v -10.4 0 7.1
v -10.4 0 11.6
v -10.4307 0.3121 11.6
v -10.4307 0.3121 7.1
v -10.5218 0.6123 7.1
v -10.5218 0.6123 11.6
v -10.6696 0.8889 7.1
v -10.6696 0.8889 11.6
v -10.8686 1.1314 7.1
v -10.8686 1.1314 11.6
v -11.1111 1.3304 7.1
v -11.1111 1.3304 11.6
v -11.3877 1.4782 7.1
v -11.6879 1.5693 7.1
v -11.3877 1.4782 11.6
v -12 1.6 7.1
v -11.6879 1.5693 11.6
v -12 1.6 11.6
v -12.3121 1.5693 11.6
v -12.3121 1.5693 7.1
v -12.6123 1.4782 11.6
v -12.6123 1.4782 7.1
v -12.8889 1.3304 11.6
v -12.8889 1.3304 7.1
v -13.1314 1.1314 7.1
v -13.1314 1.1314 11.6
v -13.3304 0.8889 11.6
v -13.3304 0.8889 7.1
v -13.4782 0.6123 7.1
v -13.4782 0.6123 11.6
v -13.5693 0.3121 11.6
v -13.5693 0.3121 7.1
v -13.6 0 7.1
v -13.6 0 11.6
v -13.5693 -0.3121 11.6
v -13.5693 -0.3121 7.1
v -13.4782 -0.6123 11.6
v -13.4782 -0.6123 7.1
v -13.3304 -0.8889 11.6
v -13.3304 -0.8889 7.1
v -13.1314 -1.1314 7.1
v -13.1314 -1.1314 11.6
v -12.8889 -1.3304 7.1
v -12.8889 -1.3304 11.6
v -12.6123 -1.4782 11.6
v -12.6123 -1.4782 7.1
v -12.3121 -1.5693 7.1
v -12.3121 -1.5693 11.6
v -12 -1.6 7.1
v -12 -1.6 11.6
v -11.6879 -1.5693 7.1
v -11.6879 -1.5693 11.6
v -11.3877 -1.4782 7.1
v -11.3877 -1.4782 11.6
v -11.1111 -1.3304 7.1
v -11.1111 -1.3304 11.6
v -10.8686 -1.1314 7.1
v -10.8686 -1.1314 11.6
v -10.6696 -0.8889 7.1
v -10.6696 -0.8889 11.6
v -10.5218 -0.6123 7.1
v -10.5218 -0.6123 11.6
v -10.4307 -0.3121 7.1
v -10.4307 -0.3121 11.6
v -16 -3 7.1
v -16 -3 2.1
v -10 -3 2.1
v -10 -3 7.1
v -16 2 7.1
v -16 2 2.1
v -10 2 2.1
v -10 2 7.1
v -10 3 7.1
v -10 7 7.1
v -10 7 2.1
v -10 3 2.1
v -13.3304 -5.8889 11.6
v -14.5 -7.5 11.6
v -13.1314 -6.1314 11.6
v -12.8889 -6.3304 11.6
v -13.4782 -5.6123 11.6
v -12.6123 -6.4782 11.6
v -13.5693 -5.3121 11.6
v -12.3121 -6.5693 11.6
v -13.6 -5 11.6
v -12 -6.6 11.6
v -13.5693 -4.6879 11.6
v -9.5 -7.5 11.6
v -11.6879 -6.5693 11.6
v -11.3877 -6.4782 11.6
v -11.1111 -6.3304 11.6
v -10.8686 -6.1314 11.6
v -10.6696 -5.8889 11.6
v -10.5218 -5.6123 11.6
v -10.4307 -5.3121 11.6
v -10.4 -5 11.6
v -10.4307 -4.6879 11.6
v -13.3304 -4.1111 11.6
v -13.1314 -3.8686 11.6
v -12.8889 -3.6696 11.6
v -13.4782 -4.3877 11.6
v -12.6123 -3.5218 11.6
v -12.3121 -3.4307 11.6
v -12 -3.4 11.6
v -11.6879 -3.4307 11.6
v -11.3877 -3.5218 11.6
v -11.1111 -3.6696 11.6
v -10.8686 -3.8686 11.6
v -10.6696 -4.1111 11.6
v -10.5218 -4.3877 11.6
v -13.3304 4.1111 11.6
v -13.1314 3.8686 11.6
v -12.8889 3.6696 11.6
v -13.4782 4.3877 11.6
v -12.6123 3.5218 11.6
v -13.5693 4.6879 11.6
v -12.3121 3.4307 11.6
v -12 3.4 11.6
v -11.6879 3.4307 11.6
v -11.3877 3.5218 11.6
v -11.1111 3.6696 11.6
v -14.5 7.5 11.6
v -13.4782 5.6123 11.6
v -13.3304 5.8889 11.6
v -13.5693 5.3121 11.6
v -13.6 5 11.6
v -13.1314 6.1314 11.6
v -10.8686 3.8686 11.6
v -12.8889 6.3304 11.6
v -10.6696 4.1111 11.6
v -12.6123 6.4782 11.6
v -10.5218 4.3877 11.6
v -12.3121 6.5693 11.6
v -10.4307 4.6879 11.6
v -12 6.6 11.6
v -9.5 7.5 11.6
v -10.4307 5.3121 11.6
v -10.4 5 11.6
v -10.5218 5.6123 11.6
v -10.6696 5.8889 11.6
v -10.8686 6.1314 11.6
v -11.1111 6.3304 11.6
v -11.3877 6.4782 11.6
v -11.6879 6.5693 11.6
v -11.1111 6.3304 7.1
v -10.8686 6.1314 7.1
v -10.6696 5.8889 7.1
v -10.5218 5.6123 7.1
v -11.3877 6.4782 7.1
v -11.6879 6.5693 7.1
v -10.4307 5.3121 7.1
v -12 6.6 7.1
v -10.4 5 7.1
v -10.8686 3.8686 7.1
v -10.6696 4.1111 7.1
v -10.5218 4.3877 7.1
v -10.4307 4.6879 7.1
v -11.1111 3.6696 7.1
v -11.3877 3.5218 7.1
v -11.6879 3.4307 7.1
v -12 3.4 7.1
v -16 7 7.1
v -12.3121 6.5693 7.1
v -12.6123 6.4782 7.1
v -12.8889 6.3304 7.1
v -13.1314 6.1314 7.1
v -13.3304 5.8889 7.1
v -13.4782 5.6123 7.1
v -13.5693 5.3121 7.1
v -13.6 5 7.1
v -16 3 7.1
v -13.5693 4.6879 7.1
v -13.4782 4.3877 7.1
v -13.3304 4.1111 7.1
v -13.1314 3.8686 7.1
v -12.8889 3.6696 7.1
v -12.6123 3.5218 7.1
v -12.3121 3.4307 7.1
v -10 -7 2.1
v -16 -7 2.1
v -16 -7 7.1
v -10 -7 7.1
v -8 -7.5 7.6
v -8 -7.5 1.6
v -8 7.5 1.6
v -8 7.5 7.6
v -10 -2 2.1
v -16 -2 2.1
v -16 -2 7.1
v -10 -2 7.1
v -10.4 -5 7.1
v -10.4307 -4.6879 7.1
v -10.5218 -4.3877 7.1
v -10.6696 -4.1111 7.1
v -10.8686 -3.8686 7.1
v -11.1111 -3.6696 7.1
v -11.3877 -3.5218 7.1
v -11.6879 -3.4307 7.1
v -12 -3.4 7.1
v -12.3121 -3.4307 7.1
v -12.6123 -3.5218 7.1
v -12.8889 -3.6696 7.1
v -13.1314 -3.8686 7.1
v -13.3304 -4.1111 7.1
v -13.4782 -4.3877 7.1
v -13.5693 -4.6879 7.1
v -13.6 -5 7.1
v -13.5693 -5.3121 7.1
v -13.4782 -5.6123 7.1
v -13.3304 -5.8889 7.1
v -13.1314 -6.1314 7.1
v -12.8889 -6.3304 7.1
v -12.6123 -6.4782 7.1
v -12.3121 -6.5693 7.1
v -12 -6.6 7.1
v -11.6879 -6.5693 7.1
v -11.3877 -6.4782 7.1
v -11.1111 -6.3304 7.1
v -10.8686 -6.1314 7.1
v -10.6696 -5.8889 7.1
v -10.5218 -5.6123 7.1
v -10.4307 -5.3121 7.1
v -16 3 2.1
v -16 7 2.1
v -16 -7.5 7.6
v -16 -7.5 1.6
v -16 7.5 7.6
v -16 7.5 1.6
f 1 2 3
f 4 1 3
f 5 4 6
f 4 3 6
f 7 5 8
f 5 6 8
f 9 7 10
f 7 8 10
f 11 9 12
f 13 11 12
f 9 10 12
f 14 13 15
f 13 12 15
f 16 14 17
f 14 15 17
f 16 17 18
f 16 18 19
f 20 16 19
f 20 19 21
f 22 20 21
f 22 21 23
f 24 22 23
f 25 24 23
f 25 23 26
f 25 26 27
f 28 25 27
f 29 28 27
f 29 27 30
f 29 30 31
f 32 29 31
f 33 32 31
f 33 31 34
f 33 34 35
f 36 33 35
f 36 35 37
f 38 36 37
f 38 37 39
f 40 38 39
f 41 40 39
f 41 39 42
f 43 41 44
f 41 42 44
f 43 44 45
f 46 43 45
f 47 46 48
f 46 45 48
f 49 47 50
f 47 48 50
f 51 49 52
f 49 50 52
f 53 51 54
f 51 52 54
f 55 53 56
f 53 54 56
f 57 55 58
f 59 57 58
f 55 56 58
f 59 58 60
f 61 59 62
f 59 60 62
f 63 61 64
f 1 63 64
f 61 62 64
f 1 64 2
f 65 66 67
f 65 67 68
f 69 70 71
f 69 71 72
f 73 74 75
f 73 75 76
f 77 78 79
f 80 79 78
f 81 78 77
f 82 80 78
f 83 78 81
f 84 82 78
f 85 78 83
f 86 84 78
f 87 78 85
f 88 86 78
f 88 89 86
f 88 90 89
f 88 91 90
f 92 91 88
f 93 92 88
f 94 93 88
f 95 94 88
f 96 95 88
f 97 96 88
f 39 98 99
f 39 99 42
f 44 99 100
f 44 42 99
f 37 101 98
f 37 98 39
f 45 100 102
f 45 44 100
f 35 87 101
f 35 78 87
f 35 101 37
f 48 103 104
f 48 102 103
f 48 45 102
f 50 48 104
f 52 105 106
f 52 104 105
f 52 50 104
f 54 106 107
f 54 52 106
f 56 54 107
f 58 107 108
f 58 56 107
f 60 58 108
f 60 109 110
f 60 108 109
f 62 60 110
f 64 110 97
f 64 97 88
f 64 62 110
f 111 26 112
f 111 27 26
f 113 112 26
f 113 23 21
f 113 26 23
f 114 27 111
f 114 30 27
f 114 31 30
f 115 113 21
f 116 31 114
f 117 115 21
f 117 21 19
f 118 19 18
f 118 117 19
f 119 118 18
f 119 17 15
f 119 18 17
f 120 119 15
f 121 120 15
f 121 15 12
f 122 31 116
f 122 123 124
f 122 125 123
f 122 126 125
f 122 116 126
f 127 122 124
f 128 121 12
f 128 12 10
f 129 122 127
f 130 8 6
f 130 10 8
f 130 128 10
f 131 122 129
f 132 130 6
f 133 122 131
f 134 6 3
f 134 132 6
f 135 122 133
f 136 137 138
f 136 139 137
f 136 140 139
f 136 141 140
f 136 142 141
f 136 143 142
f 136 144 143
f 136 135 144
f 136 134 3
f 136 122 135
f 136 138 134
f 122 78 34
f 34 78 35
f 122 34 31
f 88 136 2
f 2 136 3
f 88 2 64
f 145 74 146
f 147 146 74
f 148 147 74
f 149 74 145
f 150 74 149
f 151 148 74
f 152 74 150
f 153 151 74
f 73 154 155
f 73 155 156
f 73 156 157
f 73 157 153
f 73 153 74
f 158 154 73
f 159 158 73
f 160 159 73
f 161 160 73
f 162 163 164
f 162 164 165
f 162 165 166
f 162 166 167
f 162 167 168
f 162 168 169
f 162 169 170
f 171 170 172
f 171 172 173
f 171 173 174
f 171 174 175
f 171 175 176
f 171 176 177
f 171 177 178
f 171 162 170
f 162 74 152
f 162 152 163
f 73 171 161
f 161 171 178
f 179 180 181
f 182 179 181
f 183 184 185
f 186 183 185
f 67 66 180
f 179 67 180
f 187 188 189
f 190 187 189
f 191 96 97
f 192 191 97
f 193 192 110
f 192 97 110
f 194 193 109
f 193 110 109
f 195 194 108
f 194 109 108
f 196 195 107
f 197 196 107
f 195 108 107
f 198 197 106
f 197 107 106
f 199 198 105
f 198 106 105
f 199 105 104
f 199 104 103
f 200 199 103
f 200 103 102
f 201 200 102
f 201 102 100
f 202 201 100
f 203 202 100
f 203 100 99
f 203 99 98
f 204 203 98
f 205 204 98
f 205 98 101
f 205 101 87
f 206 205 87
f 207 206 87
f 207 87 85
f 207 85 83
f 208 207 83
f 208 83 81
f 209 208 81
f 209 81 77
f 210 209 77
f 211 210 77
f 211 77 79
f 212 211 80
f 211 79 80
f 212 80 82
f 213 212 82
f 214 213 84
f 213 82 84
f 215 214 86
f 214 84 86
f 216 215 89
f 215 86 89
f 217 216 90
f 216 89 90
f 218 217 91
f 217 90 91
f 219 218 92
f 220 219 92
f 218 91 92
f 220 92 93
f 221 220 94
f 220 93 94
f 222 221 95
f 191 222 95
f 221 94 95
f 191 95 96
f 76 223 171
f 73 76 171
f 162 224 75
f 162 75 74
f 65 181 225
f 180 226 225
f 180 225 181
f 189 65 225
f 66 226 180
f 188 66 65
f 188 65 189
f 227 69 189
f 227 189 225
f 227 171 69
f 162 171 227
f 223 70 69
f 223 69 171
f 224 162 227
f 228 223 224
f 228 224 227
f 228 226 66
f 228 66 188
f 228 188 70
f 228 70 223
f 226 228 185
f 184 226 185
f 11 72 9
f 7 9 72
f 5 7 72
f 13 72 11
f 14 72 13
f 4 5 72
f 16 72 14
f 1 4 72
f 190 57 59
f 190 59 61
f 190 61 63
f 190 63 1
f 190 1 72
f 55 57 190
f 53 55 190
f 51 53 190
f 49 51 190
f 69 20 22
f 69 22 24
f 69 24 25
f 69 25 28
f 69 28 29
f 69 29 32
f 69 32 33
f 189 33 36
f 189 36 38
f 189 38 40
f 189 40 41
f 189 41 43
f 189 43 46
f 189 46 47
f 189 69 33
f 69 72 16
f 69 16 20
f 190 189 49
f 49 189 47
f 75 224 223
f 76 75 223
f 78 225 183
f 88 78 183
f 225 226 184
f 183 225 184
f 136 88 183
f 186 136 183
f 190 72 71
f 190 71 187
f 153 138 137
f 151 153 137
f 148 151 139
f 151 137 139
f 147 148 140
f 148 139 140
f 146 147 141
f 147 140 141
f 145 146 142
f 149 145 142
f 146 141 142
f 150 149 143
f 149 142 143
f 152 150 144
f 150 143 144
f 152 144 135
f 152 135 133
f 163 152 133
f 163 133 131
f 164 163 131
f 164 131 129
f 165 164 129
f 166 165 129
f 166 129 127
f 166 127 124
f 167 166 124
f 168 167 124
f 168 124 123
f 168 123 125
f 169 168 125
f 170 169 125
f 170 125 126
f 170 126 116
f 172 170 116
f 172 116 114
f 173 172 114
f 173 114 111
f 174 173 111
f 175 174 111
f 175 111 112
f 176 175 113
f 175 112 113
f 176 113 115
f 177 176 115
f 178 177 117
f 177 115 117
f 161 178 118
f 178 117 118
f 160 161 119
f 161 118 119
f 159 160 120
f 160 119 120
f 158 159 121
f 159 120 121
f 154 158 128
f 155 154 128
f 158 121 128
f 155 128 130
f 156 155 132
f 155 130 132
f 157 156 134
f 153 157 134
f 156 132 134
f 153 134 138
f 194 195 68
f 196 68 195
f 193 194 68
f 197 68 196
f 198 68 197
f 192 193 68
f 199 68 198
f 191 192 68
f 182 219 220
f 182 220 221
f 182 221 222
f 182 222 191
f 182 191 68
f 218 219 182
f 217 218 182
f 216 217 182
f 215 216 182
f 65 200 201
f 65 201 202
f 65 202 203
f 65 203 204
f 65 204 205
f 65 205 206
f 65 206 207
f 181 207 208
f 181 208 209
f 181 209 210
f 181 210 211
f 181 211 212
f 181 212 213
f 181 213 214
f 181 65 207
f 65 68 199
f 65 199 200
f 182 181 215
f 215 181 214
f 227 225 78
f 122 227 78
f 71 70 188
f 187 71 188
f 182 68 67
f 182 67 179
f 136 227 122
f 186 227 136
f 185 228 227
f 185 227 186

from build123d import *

# Parameters (mm, degrees)
SKETCH001_W     = 8
SKETCH001_H     = 15
PAD001_DEPTH    = 10
POCKET_DEPTH    = 16
SKETCH003_R     = 1.6
POCKET001_DEPTH = 5
SKETCH004_W     = 4
SKETCH004_H     = 5
POCKET002_DEPTH = 6


with BuildPart() as part:
    # Sketch001 (on Face1 of CopyPad) → Pad001 (new body)
    with BuildSketch(Plane.XY.offset(1.6)):
        with Locations((-12, 0)):
            Rectangle(SKETCH001_W, SKETCH001_H)
    extrude(amount=PAD001_DEPTH)

    # Sketch002 (on Face1 of Pad001) → Pocket (cut)
    with BuildSketch(Plane(origin=(0, -7.5, 1.6), x_dir=(1, 0, 0), z_dir=(0, -1, 0))):
        Polygon((-16, 10), (-16, 6), (-14.5, 10), align=None)
        Polygon((-8, 10), (-9.5, 10), (-8, 6), align=None)
    extrude(amount=-POCKET_DEPTH, mode=Mode.SUBTRACT)

    # Sketch003 (on Face5 of Pocket) → Pocket001 (cut)
    with BuildSketch(Plane.XY.offset(11.6)):
        with Locations((-12, 5)):
            Circle(SKETCH003_R)
        with Locations((-12, 0)):
            Circle(SKETCH003_R)
        with Locations((-12, -5)):
            Circle(SKETCH003_R)
    extrude(amount=-POCKET001_DEPTH, mode=Mode.SUBTRACT)

    # Sketch004 (on Face7 of Pocket001) → Pocket002 (cut)
    with BuildSketch(Plane(origin=(-16, 0, 1.6), x_dir=(0, -1, 0), z_dir=(-1, 0, 0))):
        with Locations((-5, 3)):
            Rectangle(SKETCH004_W, SKETCH004_H)
        with Locations((0, 3)):
            Rectangle(SKETCH004_W, SKETCH004_H)
        with Locations((5, 3)):
            Rectangle(SKETCH004_W, SKETCH004_H)
    extrude(amount=-POCKET002_DEPTH, mode=Mode.SUBTRACT)


solid = part.part
